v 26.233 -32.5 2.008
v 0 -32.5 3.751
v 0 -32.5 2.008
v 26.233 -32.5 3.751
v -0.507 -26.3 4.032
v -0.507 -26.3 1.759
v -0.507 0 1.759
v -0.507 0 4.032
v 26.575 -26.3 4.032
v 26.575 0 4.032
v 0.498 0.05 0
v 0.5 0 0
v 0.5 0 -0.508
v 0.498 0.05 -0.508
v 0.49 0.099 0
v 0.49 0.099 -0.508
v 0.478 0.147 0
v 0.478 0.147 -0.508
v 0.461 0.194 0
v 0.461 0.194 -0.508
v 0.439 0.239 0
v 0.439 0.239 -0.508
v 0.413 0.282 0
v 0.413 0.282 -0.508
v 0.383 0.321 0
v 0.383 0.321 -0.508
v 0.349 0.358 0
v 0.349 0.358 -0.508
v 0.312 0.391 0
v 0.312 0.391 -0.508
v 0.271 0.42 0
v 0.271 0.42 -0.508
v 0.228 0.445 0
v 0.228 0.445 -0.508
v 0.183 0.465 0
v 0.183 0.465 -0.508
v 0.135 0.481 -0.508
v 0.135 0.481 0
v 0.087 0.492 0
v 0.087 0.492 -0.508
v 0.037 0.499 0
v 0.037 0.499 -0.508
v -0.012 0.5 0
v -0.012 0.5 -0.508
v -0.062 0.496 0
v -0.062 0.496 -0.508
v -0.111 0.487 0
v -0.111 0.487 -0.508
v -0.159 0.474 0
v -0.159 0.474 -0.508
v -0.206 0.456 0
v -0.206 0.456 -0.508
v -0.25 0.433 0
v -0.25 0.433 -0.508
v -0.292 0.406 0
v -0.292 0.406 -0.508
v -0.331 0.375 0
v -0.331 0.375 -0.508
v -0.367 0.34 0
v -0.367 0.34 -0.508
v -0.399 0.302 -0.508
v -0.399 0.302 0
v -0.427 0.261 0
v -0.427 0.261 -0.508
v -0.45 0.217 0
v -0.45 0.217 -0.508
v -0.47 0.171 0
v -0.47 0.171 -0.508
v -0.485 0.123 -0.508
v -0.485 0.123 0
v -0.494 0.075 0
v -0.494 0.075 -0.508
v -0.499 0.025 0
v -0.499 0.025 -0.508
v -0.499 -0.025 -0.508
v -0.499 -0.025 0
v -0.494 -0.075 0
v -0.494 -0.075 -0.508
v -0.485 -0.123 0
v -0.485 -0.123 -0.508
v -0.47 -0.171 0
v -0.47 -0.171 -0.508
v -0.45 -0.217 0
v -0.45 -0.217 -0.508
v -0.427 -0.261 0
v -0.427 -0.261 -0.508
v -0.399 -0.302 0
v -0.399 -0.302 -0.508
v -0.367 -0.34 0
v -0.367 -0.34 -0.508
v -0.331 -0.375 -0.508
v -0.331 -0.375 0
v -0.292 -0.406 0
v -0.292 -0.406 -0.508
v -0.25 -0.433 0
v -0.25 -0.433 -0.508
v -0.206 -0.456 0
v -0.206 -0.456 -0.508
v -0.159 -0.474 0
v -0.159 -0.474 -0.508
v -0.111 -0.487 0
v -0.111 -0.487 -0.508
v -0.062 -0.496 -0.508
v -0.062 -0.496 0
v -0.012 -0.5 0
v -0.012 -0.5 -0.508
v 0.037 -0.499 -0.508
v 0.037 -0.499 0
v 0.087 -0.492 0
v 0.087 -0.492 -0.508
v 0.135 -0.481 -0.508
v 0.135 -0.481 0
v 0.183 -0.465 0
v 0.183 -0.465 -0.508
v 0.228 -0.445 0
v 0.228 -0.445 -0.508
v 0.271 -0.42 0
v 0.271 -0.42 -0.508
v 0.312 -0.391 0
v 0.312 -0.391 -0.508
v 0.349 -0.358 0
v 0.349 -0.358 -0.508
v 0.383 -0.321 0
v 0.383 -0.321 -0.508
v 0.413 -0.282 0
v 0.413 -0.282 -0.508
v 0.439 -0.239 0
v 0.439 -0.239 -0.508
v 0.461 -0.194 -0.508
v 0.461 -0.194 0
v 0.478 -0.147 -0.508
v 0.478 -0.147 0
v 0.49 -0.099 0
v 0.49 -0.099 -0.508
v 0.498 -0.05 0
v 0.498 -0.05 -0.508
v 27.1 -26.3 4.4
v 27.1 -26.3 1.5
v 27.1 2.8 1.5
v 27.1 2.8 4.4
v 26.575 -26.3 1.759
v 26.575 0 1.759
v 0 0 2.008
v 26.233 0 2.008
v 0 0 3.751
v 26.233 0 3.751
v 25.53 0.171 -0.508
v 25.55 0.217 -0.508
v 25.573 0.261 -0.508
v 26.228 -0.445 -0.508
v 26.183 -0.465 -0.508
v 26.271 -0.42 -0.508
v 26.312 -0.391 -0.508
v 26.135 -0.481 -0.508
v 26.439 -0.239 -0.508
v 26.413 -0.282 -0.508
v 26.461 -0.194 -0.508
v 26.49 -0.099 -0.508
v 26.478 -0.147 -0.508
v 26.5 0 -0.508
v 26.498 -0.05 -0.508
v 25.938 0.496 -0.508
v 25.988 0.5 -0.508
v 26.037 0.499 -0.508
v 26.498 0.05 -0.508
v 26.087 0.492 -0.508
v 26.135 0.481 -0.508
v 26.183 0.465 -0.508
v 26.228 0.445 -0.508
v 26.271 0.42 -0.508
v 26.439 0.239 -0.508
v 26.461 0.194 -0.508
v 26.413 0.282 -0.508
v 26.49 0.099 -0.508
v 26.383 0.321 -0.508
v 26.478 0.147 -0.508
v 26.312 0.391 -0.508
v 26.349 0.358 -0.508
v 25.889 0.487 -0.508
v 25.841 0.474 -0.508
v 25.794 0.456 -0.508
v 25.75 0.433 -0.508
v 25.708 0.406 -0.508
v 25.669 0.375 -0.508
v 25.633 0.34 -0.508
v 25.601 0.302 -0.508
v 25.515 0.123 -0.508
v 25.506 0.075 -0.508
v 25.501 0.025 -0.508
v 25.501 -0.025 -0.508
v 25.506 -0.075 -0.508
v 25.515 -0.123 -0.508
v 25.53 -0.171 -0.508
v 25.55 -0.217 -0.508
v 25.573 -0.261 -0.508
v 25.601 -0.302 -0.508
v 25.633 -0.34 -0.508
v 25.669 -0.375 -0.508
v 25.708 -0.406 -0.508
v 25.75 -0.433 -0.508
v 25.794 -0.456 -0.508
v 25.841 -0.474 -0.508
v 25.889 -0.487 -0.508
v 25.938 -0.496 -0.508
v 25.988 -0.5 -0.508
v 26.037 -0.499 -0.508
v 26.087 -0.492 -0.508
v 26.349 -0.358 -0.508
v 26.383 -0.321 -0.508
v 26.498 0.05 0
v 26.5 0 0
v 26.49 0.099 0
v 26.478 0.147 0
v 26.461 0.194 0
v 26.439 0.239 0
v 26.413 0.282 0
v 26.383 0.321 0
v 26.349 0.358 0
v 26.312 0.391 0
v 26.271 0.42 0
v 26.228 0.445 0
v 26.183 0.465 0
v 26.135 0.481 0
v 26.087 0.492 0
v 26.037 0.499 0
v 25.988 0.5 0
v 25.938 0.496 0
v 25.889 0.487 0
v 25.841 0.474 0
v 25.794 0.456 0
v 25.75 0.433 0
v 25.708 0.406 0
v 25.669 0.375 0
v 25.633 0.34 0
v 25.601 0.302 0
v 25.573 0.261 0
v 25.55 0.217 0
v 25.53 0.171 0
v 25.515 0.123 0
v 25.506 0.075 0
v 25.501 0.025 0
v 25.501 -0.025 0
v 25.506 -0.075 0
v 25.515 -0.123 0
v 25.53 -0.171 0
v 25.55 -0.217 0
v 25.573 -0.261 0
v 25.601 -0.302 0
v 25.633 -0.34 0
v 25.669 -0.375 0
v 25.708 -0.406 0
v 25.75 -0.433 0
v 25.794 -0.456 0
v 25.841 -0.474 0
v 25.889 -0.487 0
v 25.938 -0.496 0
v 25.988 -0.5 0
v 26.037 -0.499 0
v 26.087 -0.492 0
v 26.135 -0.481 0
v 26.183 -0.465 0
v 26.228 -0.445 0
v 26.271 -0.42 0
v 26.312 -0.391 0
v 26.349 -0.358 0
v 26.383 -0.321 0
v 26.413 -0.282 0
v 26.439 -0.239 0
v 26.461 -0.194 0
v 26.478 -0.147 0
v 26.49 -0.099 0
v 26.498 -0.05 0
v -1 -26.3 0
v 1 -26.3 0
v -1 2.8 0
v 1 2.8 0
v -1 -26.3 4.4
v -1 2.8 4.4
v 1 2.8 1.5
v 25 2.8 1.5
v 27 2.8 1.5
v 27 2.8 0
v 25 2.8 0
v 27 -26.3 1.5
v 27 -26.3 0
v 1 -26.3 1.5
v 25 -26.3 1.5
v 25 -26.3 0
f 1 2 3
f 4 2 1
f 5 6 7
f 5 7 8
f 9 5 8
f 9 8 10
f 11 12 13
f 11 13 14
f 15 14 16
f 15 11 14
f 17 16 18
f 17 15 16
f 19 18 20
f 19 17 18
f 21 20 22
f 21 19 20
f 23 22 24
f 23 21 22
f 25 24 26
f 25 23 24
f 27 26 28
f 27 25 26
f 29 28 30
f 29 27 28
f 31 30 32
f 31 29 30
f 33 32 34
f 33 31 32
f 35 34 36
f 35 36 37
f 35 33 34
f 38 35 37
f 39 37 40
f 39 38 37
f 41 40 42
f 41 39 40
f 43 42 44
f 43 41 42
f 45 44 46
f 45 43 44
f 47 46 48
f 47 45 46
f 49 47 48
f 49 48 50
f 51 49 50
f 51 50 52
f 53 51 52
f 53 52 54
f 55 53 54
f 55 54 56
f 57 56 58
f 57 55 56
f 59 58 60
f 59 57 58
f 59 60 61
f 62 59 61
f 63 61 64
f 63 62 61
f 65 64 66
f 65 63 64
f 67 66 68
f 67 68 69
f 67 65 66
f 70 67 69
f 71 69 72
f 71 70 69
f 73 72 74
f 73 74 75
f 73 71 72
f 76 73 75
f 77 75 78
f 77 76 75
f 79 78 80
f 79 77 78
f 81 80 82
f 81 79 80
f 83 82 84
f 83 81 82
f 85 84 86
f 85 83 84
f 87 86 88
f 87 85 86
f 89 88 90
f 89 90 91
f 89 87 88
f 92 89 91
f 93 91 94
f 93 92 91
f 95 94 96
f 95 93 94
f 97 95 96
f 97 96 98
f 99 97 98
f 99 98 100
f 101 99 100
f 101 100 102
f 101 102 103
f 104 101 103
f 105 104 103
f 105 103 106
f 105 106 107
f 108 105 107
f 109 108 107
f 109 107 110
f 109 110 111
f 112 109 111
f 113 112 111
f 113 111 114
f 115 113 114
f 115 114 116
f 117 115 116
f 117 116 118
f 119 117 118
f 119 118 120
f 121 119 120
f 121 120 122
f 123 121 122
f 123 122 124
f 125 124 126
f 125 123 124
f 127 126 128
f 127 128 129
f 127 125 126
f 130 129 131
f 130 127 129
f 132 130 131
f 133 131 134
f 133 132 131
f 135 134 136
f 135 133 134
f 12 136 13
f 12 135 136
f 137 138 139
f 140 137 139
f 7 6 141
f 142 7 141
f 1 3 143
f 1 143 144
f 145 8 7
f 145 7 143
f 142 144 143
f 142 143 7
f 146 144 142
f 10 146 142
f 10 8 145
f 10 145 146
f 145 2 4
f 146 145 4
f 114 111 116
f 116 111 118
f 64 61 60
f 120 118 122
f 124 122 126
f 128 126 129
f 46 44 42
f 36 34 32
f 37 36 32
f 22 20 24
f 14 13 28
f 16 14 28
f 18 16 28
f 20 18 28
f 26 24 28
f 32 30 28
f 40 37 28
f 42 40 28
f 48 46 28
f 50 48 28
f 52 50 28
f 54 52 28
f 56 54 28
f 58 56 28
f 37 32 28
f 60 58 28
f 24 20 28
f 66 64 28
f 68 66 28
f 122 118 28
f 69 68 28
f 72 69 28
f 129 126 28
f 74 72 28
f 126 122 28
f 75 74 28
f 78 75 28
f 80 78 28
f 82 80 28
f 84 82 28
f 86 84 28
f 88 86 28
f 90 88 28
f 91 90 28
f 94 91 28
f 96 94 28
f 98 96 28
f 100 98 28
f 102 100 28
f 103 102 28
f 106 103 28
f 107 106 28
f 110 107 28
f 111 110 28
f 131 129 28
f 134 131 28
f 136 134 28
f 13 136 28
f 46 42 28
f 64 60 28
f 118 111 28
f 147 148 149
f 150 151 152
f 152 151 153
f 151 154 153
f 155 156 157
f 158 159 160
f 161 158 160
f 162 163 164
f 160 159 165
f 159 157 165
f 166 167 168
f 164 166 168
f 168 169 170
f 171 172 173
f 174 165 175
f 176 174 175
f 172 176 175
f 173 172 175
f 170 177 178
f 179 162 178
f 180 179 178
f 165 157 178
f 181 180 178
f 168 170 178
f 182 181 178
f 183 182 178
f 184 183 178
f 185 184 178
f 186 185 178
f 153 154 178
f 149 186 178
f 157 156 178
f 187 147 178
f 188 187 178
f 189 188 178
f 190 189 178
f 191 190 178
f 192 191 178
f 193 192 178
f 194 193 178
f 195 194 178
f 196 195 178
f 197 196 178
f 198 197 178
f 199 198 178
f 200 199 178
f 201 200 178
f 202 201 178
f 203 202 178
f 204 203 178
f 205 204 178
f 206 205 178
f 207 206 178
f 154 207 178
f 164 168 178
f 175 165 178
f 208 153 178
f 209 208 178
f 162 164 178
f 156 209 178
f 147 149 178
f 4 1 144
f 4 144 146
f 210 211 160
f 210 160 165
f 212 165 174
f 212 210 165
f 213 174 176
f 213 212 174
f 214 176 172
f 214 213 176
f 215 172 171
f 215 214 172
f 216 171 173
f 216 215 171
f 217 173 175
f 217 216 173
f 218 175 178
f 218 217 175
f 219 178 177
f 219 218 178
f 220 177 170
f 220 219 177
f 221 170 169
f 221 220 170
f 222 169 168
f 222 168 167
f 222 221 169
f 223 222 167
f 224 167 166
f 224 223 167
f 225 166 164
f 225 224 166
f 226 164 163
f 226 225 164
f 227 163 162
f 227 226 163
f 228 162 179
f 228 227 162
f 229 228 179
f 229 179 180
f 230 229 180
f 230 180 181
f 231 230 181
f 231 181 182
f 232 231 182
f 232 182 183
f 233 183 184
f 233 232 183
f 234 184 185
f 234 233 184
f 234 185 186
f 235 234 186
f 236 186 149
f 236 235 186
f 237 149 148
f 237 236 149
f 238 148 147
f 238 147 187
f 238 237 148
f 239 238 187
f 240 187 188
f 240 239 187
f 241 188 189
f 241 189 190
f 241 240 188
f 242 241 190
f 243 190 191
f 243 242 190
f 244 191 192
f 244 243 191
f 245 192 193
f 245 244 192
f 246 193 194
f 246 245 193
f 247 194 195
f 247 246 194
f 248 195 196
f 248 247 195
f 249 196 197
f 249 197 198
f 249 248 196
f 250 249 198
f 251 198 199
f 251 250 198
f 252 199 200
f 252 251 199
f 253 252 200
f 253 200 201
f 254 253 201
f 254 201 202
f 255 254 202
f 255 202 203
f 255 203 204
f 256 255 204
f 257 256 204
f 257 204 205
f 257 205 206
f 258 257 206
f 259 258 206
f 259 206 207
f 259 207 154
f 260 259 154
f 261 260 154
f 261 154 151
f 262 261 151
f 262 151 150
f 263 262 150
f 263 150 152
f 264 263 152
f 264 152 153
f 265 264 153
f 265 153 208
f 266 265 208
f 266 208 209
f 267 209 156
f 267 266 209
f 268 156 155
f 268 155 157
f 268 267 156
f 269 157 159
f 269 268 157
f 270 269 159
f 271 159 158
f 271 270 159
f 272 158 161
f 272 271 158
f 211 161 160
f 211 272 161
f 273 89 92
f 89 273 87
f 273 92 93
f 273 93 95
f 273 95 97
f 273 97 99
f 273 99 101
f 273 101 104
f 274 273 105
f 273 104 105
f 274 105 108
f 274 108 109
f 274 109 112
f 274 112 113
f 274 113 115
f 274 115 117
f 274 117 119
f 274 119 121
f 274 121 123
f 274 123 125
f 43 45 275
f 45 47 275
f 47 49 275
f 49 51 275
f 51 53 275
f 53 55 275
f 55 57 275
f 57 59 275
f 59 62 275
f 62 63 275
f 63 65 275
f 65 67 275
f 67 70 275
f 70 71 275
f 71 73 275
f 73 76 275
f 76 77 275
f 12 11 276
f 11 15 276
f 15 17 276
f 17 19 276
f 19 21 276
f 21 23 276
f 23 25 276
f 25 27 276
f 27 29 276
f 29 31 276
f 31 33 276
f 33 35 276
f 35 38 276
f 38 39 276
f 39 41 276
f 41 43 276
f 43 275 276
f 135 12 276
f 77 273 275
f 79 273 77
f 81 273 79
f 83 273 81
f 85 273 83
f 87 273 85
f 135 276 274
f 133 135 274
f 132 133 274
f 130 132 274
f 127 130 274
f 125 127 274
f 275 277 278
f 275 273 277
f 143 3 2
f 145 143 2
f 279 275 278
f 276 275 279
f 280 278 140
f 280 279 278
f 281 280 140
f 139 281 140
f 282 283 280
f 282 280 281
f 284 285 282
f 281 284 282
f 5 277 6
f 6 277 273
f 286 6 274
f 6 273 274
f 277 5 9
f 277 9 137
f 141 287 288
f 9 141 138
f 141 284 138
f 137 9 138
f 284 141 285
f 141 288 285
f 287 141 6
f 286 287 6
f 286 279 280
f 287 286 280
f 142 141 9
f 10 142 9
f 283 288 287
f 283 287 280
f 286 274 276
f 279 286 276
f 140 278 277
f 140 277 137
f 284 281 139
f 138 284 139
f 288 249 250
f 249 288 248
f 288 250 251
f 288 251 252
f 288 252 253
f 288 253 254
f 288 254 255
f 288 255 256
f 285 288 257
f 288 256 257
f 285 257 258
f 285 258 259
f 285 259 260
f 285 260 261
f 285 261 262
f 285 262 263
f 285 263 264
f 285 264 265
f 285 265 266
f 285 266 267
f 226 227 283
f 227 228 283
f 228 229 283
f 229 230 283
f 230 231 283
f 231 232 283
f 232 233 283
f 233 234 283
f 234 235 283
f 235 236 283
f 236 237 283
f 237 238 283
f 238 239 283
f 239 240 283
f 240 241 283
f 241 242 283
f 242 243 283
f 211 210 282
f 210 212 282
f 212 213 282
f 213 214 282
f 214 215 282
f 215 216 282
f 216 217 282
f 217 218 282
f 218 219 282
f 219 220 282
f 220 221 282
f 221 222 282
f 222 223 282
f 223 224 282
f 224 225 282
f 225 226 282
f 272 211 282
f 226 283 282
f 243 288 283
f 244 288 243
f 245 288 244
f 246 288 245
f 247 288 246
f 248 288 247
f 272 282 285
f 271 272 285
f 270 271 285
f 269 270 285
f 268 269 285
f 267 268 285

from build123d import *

# Parameters (mm, degrees)
SKETCH1_R          = 0.5
EXTRUDE1_DEPTH     = 0.508
EXTRUDE1_2_DEPTH   = 0.508
SKETCH2_W          = 2
SKETCH2_H          = 29.1
EXTRUDE2_DEPTH     = 1.5
SKETCH3_W          = 28.1
SKETCH3_H          = 29.1
EXTRUDE3_DEPTH     = 2.9
SKETCH4_W          = 27.082087072
SKETCH4_H          = 2.272405007
CUT_EXTRUDE1_DEPTH = 26.3
SKETCH5_W          = 26.233061925
SKETCH5_H          = 1.7432148
EXTRUDE4_DEPTH     = 32.5


with BuildPart() as part:
    # Sketch1 → Extrude1 (new body)
    with BuildSketch(Plane.XY):
        Circle(SKETCH1_R)
    extrude(amount=-EXTRUDE1_DEPTH)



with BuildPart() as body_2:
    # Sketch1 → Extrude1 2 (new body)
    with BuildSketch(Plane.XY):
        with Locations((26, 0)):
            Circle(SKETCH1_R)
    extrude(amount=-EXTRUDE1_2_DEPTH)


with BuildPart() as part_1:
    add(part.part)

    add(body_2.part)  # Extrude2 merges body 2
    # Sketch2 → Extrude2 (add)
    with BuildSketch(Plane.XY):
        with Locations((0, -11.75)):
            Rectangle(SKETCH2_W, SKETCH2_H)
        with Locations((26, -11.75)):
            Rectangle(SKETCH2_W, SKETCH2_H)
    extrude(amount=EXTRUDE2_DEPTH)

    # Sketch3 → Extrude3 (add)
    with BuildSketch(Plane.XY.offset(1.5)):
        with Locations((13.05, -11.75)):
            Rectangle(SKETCH3_W, SKETCH3_H)
    extrude(amount=EXTRUDE3_DEPTH)

    # Sketch4 → Cut-Extrude1 (cut)
    with BuildSketch(Plane.XZ.offset(26.3)):
        with Locations((13.034435582, 2.89542949)):
            Rectangle(SKETCH4_W, SKETCH4_H)
    extrude(amount=-CUT_EXTRUDE1_DEPTH, mode=Mode.SUBTRACT)

    # Sketch5 → Extrude4 (add)
    with BuildSketch(Plane.XZ):
        with Locations((13.116530963, 2.879865071)):
            Rectangle(SKETCH5_W, SKETCH5_H)
    extrude(amount=EXTRUDE4_DEPTH)


solid = part_1.part
